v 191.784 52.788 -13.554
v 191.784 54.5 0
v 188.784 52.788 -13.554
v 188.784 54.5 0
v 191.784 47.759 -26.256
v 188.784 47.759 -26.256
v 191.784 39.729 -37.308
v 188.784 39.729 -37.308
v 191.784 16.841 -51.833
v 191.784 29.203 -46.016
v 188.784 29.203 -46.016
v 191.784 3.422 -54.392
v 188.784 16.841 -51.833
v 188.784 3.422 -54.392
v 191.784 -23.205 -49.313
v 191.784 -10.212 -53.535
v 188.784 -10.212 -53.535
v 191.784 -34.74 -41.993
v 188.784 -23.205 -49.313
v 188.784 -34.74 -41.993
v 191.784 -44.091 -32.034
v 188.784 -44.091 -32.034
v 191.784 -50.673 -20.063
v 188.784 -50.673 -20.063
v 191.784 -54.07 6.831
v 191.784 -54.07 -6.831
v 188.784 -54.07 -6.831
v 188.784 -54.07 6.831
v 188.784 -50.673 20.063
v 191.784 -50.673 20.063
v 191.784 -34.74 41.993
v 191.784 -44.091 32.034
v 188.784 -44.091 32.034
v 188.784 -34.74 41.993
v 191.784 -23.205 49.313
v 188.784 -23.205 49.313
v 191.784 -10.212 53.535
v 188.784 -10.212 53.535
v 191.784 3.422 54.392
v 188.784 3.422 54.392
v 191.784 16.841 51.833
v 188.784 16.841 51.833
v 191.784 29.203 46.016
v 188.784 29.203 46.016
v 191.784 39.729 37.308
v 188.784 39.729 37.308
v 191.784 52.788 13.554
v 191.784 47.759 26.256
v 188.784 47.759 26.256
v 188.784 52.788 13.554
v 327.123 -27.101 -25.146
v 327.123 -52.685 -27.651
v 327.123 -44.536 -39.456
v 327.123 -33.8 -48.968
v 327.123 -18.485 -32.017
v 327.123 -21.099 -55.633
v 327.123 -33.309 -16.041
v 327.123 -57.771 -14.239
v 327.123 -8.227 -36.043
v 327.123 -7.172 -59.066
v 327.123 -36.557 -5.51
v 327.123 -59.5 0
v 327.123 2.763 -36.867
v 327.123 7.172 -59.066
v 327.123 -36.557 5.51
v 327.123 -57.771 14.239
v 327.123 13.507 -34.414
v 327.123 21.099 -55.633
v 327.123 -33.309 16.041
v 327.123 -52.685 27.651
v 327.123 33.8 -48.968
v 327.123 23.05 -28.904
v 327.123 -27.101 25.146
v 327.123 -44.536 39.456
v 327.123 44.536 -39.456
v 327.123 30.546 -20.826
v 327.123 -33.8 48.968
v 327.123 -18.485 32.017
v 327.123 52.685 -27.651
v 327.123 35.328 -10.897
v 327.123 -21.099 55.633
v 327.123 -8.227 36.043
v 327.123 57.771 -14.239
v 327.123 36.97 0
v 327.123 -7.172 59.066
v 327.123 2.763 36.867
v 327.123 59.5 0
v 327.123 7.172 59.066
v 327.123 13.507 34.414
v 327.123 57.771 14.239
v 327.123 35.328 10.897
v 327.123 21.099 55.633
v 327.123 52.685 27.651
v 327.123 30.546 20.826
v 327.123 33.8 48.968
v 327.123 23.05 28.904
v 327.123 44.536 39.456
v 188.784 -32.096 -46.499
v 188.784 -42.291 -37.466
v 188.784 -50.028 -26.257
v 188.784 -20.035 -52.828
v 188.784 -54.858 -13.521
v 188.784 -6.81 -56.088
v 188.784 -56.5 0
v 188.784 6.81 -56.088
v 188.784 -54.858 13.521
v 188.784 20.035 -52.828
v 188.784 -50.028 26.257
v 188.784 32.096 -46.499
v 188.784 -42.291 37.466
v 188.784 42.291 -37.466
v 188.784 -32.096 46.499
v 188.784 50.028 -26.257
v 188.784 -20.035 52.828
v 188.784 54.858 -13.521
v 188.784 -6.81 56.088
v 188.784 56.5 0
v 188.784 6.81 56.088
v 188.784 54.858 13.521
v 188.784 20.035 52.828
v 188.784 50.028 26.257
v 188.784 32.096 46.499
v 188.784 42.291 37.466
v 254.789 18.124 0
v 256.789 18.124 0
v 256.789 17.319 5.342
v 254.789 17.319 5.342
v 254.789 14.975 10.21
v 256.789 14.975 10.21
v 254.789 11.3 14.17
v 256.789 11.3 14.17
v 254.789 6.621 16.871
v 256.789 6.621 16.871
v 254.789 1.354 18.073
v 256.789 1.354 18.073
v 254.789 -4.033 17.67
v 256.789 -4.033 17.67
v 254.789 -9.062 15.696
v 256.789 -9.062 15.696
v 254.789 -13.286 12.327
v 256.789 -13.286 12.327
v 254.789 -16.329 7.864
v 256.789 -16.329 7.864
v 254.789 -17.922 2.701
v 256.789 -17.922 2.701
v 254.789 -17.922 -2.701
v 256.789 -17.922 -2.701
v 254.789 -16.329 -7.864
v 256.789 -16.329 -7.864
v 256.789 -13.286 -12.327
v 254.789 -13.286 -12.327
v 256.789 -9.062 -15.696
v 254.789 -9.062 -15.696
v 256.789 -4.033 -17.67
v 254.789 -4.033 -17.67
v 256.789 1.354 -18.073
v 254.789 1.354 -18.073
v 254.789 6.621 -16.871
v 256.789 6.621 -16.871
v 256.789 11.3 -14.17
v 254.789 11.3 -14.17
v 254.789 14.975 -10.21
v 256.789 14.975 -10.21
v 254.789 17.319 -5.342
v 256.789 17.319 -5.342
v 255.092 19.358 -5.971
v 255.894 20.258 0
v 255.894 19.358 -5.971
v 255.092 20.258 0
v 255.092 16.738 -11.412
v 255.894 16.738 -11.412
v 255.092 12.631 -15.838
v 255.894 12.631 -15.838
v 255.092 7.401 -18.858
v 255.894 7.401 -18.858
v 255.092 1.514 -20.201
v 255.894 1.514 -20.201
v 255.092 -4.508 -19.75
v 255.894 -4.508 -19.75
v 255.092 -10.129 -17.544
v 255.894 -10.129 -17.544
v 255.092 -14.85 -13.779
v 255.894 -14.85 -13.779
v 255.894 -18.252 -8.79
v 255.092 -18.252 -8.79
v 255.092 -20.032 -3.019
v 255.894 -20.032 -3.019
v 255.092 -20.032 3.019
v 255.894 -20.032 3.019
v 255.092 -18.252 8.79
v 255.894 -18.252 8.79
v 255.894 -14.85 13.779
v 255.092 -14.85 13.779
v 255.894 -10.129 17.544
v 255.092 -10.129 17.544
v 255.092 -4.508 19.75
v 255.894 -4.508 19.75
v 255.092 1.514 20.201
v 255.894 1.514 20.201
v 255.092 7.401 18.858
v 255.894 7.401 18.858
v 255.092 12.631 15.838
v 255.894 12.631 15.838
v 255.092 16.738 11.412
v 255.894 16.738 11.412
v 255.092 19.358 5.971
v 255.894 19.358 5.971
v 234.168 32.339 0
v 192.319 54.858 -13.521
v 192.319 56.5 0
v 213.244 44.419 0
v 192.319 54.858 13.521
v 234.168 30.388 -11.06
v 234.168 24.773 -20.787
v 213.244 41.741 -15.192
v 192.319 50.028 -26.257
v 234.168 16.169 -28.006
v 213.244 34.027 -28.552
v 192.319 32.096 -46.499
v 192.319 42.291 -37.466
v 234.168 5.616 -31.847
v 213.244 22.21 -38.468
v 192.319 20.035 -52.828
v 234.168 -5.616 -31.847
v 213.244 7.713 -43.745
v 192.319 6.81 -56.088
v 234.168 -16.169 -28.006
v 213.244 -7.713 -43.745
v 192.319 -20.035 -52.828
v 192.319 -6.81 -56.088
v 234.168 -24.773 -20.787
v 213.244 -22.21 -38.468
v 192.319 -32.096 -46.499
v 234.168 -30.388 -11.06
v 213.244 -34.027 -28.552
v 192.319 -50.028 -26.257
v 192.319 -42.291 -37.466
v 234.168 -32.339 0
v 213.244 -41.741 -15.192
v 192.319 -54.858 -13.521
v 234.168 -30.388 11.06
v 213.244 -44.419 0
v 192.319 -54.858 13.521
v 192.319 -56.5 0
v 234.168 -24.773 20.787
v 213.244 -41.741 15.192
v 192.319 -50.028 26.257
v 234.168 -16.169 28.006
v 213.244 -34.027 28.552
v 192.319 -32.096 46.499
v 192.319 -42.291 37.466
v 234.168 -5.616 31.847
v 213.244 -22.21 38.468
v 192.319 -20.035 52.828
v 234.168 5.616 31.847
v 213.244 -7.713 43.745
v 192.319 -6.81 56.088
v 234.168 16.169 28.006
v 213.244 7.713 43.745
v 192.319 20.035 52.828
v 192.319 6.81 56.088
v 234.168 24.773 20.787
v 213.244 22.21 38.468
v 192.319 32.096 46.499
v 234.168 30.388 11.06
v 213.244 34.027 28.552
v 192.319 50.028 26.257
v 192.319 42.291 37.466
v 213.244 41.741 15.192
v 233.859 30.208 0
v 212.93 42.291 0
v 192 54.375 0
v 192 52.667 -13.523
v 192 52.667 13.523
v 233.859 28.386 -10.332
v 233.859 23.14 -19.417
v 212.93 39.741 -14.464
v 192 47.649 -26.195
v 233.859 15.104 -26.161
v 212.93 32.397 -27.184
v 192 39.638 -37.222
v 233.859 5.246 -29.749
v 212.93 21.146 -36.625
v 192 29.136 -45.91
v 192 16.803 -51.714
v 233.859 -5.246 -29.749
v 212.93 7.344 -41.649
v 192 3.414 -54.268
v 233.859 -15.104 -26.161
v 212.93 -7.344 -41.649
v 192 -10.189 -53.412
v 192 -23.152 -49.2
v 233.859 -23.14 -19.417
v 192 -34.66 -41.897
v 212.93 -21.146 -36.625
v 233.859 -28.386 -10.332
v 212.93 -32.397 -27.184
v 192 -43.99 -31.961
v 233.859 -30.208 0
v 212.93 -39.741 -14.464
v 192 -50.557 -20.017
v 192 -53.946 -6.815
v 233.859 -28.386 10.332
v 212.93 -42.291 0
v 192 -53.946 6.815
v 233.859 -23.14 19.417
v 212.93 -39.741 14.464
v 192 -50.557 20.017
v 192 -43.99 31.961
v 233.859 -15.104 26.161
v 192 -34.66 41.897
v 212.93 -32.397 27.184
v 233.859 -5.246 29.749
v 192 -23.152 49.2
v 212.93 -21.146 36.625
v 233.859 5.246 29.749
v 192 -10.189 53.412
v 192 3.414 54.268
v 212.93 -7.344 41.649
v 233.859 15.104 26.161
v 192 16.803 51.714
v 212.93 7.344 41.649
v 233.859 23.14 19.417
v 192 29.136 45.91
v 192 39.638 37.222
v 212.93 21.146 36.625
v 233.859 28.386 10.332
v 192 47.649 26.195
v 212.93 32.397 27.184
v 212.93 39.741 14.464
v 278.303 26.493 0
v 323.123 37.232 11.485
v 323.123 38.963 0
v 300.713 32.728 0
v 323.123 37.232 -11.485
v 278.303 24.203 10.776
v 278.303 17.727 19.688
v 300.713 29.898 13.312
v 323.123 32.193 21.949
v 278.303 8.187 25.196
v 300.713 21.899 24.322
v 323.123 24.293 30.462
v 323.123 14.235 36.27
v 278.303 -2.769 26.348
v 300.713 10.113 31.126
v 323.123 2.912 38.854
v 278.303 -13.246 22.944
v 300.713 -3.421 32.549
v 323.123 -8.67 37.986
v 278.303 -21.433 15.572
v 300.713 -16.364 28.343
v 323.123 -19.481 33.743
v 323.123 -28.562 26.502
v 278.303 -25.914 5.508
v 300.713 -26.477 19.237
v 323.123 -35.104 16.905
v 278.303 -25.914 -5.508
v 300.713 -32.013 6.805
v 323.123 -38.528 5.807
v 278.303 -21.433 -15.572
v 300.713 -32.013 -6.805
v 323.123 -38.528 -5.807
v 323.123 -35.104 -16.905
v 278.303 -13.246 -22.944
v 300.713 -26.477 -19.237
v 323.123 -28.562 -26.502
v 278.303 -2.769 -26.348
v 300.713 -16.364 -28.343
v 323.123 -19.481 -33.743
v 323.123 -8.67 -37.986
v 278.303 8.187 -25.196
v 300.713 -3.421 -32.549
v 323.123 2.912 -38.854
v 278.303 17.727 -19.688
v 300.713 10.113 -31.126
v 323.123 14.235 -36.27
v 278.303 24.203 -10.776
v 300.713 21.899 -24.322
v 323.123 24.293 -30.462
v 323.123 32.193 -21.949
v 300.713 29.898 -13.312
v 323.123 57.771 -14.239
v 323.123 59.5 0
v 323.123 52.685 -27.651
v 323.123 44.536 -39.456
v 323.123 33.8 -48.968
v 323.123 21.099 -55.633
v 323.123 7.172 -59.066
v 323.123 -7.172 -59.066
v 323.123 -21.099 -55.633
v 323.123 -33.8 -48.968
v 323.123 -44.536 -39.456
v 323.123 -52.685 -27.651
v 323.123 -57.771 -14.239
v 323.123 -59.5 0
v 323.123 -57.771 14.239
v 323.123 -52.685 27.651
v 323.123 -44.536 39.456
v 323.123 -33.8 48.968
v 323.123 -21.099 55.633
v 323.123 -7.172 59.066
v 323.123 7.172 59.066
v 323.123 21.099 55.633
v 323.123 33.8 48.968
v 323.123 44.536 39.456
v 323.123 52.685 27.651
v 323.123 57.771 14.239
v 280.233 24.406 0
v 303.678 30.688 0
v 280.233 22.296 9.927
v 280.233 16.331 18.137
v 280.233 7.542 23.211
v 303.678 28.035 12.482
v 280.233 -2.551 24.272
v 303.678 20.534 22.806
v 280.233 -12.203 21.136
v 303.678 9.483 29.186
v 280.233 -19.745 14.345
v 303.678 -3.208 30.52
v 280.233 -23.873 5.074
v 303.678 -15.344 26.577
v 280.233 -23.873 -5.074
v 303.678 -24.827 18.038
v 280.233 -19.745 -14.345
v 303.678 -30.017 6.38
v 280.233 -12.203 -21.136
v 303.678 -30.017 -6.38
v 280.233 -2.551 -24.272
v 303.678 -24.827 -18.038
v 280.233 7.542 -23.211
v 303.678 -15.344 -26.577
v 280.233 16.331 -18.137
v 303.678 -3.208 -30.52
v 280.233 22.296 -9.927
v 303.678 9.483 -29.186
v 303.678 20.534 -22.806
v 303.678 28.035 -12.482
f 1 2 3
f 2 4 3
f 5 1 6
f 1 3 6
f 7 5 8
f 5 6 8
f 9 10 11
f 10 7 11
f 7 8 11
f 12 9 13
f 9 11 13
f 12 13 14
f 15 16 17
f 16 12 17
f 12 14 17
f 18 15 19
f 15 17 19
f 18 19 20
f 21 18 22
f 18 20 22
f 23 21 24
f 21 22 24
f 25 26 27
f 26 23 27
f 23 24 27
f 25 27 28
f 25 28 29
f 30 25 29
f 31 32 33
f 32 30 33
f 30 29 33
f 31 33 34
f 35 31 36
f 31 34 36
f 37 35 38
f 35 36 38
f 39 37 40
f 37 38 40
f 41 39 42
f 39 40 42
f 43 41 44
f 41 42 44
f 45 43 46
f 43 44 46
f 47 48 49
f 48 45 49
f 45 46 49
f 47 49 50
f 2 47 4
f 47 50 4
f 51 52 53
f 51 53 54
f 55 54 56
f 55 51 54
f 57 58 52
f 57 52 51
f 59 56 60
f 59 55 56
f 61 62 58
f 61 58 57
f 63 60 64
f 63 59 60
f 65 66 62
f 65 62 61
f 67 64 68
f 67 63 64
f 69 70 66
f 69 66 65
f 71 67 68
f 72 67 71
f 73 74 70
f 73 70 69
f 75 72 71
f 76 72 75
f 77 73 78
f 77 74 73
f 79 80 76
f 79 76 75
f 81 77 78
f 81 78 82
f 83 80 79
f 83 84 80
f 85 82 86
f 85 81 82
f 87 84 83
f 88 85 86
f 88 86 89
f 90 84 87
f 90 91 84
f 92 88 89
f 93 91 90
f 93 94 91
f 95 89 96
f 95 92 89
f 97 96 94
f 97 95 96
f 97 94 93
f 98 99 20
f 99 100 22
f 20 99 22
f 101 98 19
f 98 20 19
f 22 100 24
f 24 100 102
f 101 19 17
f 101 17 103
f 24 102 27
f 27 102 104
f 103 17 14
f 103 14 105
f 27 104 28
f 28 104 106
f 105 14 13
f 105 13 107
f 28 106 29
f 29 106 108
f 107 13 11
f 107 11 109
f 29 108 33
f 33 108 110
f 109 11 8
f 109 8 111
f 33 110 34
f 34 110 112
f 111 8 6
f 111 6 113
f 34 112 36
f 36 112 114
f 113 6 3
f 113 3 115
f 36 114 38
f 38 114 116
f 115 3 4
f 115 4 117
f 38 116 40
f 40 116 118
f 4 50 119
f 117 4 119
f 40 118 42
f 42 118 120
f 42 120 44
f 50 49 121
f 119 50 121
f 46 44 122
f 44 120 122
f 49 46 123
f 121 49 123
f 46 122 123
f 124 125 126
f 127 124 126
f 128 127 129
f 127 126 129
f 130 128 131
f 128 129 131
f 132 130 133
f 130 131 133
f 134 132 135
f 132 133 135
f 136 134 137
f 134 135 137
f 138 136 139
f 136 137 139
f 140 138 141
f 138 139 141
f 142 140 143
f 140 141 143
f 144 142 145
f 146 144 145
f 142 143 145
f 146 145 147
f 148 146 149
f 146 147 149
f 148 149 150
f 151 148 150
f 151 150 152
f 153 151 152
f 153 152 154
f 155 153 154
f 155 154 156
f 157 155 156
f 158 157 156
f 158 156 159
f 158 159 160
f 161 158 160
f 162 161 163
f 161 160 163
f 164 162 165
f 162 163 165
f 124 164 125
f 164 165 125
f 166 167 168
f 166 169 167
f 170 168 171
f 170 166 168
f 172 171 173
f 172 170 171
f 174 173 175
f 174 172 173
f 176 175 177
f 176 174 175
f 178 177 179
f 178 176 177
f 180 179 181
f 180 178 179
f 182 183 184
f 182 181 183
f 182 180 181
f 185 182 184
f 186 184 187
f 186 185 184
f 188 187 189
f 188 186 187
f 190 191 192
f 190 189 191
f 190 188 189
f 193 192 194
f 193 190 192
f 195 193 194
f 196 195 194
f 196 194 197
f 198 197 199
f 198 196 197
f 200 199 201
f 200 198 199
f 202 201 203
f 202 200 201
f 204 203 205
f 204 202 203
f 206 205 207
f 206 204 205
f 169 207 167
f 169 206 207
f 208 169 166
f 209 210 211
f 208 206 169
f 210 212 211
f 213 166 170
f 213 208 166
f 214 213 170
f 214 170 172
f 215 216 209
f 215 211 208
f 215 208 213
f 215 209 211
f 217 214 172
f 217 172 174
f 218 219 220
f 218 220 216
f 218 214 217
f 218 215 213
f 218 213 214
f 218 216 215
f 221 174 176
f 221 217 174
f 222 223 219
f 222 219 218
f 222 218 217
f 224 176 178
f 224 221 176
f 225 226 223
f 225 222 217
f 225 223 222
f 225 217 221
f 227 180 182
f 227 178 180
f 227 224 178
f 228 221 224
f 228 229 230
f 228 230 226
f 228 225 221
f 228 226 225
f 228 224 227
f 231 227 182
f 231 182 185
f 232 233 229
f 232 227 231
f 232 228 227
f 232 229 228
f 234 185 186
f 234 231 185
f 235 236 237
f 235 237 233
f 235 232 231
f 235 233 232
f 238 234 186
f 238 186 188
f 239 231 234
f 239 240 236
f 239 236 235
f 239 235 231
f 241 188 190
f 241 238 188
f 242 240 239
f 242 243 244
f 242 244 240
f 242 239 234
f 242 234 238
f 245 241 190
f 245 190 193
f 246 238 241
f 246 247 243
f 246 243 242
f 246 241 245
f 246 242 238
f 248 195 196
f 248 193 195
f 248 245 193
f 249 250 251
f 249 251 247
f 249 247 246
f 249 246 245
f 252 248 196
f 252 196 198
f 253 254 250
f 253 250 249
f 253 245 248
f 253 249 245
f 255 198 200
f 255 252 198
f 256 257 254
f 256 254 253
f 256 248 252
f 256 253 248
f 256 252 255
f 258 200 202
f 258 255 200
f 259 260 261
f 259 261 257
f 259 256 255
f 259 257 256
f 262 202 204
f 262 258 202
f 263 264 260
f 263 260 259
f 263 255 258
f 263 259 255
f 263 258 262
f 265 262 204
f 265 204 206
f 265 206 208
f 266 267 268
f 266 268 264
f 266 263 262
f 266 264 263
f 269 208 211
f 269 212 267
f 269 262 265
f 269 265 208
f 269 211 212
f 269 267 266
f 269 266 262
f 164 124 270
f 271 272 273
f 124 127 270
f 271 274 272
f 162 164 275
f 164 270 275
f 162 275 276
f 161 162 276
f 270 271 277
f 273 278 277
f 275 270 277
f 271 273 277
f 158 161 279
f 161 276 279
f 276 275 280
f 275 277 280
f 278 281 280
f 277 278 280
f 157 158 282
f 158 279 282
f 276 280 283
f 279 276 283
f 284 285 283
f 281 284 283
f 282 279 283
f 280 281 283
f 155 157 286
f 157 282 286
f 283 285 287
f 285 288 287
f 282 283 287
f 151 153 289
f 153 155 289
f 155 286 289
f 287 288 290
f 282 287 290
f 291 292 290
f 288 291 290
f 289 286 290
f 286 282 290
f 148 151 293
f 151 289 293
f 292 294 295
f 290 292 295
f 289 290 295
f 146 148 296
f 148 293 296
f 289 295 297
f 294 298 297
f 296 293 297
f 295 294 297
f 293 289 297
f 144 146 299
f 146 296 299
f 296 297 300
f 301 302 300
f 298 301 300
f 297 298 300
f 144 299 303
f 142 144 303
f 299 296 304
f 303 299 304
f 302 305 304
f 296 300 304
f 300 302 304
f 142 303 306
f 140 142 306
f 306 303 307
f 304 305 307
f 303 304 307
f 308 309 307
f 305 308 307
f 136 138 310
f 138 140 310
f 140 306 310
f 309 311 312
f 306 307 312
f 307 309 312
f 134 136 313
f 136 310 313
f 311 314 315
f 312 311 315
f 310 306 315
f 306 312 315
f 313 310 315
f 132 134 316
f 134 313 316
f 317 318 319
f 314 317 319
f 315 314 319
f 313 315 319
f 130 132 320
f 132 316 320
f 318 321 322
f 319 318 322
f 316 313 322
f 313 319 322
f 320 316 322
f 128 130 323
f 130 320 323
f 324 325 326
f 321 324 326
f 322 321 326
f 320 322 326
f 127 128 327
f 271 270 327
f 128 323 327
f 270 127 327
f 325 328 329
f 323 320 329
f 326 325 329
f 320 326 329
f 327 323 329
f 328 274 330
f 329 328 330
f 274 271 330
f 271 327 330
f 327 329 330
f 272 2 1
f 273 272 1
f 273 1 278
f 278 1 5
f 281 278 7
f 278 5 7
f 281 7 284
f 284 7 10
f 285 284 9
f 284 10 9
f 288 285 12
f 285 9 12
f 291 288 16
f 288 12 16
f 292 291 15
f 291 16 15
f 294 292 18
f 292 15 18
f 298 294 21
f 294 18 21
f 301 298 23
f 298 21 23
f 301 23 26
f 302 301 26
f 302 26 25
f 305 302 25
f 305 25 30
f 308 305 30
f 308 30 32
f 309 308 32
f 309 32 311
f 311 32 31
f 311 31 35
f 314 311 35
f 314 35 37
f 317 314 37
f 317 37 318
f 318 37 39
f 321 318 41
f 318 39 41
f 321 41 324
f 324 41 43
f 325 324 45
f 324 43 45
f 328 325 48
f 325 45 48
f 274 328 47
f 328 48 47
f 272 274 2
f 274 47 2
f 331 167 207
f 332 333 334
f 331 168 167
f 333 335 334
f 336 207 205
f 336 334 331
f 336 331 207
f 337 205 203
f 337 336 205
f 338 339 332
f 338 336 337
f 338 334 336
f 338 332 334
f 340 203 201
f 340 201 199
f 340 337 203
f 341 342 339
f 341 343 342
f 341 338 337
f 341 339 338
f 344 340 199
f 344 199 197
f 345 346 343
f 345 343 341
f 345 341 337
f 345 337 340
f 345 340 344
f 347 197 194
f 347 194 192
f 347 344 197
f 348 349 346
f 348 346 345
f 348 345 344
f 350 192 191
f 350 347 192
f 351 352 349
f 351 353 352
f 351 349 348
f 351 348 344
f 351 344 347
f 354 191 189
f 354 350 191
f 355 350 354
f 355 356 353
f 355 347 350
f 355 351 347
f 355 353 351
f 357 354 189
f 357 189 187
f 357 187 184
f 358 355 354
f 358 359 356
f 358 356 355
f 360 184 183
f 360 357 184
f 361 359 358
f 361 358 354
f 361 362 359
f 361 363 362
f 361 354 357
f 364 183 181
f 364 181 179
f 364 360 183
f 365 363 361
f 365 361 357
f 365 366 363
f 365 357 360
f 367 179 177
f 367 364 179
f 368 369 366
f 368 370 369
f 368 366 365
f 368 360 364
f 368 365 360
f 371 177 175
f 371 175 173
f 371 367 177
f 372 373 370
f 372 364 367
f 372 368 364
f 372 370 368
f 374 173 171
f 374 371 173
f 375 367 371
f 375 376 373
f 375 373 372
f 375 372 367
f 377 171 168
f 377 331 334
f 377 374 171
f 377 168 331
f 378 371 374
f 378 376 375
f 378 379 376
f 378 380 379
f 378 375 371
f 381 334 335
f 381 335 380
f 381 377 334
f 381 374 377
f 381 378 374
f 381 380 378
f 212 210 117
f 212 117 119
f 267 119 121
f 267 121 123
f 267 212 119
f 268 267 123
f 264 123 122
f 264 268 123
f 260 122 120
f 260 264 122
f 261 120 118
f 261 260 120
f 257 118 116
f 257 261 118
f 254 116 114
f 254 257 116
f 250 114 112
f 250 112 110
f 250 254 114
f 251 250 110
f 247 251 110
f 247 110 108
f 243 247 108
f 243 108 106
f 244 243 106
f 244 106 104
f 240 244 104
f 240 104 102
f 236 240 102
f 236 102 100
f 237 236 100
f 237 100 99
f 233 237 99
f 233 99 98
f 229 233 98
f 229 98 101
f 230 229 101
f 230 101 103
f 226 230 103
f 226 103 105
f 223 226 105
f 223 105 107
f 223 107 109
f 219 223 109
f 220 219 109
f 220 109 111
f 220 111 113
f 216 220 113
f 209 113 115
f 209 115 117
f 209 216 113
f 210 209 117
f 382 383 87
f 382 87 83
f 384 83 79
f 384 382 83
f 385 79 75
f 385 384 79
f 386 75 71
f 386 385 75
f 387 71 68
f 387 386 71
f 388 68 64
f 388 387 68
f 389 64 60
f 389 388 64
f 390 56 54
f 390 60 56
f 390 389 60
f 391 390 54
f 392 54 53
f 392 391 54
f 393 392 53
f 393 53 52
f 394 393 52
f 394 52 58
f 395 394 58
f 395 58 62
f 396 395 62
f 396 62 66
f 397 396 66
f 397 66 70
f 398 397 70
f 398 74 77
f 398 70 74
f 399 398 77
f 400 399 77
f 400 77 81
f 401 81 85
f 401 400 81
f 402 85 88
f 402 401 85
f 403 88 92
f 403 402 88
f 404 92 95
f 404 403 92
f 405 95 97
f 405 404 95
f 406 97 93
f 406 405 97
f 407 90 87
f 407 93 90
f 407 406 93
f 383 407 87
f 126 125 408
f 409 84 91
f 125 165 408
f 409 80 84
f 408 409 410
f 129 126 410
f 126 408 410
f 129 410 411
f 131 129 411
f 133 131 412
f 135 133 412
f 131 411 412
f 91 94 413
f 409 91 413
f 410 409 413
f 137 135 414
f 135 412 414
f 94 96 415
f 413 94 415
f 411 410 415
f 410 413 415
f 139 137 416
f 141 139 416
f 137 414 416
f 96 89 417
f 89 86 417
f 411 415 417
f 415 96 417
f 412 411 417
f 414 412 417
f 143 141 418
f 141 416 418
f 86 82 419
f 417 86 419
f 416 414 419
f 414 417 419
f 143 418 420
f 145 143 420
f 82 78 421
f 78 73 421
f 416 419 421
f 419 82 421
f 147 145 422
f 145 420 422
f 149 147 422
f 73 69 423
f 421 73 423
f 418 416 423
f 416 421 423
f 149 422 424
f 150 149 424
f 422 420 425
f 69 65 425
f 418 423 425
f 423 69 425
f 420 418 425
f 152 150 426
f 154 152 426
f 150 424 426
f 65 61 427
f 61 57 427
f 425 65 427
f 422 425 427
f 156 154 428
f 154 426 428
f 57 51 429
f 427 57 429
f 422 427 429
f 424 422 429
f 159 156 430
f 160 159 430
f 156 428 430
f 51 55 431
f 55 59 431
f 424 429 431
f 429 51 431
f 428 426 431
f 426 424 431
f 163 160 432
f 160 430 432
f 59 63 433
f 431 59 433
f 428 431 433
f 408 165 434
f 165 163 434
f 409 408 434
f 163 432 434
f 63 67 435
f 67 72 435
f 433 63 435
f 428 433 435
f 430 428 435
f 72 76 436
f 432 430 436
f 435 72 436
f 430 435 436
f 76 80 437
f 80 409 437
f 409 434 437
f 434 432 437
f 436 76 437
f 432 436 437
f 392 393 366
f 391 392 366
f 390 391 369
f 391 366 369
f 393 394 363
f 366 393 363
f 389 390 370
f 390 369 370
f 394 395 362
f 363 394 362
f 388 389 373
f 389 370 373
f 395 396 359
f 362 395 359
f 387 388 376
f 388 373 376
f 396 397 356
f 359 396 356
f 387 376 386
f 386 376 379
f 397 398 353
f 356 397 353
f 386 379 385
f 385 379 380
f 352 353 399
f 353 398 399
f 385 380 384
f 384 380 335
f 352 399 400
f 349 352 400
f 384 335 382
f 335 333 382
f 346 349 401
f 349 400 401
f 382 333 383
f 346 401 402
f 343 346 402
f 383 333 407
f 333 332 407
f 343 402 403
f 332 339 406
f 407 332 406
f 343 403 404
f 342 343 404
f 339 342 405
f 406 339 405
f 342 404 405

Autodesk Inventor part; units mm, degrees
ref_plane "YZ Plane" through (0, 0, 0) normal (1, 0, 0) x (0, 1, 0)
ref_plane "XZ Plane" through (0, 0, 0) normal (0, 1, 0) x (-1, 0, 0)
ref_plane "XY Plane" through (0, 0, 0) normal (0, 0, 1) x (1, 0, 0)
sketch "Sketch1" plane through (0, 0, 0) normal (0, 0, 1) x (1, 0, 0)
  line L0 (254.7886, 18.124) -> (254.7886, 0) construction
  line L1 (192, 54.375) -> (254.7886, 18.124)
  line L2 (0, 0) -> (487.78, 0)
  line L3 (254.7886, 18.124) -> (256.7886, 18.124)
  line L4 (256.7886, 18.124) -> (327.1228, 36.97)
  line L5 (327.1228, 36.97) -> (327.1228, 0)
  line L6 (327.1228, 40.0758) -> (255.8936, 20.258)
  line L7 (255.8936, 20.258) -> (255.0924, 20.258)
  line L8 (255.0924, 20.258) -> (192.3194, 56.5)
  line L9 (327.1228, 36.97) -> (327.1228, 40.0758)
  line L10 (192, 54.375) -> (191.7835, 54.5)
  line L11 (0, 0) -> (0, 54.5)
  line L12 (0, 54.5) -> (274.8621, 54.5) construction
  line L13 (191.7835, 54.5) -> (188.7835, 54.5)
  line L14 (188.7835, 54.5) -> (188.7835, 56.5)
  line L15 (188.7835, 56.5) -> (192.3194, 56.5)
  line L16 (327.1228, 0) -> (327.1228, 59.5)
  line L17 (327.1228, 59.5) -> (323.1228, 59.5)
  line L18 (323.1228, 59.5) -> (323.1228, 38.9629)
  point P0 (322.4487, 38.7754)
  point P1 (191.9595, 55.4142)
  point P2 (188.9595, 55.4)
  dimension "d2" = 18.124
  dimension "d4" = 30
  dimension "d5" = 18.124
  dimension "d6" = 2
  dimension "d7" = 15
  dimension "d8" = 36.97
  dimension "d9" = 2
  dimension "d19" = 54.5
  dimension "d20" = 3
  dimension "d21" = 2
  dimension "d22" = 59.5
  dimension "d23" = 4
revolve "Revolution1" add sketch "Sketch1" angle 360 about axis through (0, 0, 0) along (1, 0, 0)
properties part number "stainless steel final nozzle" material "Stainless Steel"
